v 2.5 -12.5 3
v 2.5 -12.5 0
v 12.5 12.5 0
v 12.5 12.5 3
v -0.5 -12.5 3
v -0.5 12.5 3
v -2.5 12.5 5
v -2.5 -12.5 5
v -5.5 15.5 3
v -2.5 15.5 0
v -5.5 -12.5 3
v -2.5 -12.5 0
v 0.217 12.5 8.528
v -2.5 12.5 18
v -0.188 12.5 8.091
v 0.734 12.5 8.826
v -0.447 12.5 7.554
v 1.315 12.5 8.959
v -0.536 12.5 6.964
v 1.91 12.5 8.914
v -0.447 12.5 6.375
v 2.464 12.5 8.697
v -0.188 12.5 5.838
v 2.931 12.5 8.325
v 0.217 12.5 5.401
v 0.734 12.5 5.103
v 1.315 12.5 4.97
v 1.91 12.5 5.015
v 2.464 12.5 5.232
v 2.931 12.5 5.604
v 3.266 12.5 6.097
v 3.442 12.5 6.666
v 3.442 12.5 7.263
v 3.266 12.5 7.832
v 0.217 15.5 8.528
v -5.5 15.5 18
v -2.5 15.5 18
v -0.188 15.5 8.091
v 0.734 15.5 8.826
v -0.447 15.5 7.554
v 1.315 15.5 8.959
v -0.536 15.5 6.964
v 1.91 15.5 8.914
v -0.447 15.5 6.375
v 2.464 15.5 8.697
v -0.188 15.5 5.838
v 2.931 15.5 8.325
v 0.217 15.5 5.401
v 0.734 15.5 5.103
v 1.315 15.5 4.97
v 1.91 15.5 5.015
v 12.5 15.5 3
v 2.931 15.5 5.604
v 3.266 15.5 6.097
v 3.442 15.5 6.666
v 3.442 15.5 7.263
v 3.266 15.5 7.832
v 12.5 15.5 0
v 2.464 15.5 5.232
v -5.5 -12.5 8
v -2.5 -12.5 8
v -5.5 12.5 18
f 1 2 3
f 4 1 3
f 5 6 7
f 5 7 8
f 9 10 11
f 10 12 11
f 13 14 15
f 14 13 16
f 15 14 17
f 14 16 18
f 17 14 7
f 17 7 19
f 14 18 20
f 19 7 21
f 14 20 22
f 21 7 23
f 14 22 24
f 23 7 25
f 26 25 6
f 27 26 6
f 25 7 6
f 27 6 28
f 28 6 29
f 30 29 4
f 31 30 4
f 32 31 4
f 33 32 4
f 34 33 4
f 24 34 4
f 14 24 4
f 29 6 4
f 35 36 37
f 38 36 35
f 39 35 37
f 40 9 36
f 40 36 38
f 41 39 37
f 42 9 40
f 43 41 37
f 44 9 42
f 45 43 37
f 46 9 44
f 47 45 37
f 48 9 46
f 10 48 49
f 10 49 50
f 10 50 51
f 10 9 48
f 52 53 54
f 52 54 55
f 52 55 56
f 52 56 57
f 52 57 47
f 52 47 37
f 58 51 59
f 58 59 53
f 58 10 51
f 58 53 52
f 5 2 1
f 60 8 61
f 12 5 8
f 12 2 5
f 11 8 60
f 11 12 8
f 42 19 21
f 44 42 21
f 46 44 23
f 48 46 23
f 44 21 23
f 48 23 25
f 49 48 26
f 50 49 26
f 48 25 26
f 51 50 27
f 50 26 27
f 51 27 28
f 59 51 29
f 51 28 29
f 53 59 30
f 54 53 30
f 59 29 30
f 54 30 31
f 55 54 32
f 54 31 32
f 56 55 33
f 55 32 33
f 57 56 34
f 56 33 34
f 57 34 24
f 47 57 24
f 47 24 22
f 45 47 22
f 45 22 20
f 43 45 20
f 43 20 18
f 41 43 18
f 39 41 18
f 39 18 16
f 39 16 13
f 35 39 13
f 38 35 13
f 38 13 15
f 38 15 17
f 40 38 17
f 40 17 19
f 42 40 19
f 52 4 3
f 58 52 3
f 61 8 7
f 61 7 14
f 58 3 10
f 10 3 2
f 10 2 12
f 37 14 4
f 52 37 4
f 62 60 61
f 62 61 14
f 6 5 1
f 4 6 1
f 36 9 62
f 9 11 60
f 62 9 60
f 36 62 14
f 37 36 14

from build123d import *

# Parameters (mm, degrees)
BOSS_EXTRUDE1_DEPTH      = 3
BOSS_EXTRUDE2_DEPTH      = 25
BOSS_EXTRUDE3_DEPTH      = 3
F_4_0_4_DIAMETER_HOLE1_D = 4
CHAMFER2_SIZE            = 2


with BuildPart() as part:
    # Sketch1 → Boss-Extrude1 (new body)
    with BuildSketch(Plane.XY):
        Polygon((-2.5, 12.5), (-2.5, -12.5), (2.5, -12.5), (12.5, 12.5), align=None)
    extrude(amount=BOSS_EXTRUDE1_DEPTH)


with BuildPart() as body_2:
    # Mirror3: mirrored copy
    add(part.part.mirror(Plane(origin=(-2.75, 0, 2.75), x_dir=(0.7071067811865465, 0, 0.7071067811865486), z_dir=(-0.7071067811865488, 0, 0.7071067811865464))))


with BuildPart() as part_1:
    add(part.part)

    add(body_2.part)  # Boss-Extrude2 merges body 2
    # Sketch3 → Boss-Extrude2 (add, through all)
    with BuildSketch(Plane(origin=(0, 12.5, 0), x_dir=(1, 0, 0), z_dir=(0, 1, 0))):
        Polygon((-5.5, -3), (-2.5, 0), (-2.5, -3), align=None)
    extrude(amount=-BOSS_EXTRUDE2_DEPTH)

    # Sketch5 → Boss-Extrude3 (add)
    with BuildSketch(Plane(origin=(0, 12.5, 0), x_dir=(1, 0, 0), z_dir=(0, 1, 0))):
        Polygon((-2.5, -18), (12.5, -3), (12.5, 0), (-2.5, 0), (-5.5, -3), (-5.5, -18), align=None)
    extrude(amount=BOSS_EXTRUDE3_DEPTH)

    # Ø4.0 (4) Diameter Hole1 (through all)
    with Locations(Plane(origin=(0, 15.5, 0), x_dir=(1, 0, 0), z_dir=(0, 1, 0))):
        with Locations((1.464466094, -6.964466094)):
            Hole(F_4_0_4_DIAMETER_HOLE1_D / 2)

    # Chamfer2
    chamfer2_edges = [part_1.edges().sort_by_distance(p)[0] for p in [
        (-2.5, 0, 3),
    ]]
    chamfer(chamfer2_edges, length=CHAMFER2_SIZE)


solid = part_1.part
